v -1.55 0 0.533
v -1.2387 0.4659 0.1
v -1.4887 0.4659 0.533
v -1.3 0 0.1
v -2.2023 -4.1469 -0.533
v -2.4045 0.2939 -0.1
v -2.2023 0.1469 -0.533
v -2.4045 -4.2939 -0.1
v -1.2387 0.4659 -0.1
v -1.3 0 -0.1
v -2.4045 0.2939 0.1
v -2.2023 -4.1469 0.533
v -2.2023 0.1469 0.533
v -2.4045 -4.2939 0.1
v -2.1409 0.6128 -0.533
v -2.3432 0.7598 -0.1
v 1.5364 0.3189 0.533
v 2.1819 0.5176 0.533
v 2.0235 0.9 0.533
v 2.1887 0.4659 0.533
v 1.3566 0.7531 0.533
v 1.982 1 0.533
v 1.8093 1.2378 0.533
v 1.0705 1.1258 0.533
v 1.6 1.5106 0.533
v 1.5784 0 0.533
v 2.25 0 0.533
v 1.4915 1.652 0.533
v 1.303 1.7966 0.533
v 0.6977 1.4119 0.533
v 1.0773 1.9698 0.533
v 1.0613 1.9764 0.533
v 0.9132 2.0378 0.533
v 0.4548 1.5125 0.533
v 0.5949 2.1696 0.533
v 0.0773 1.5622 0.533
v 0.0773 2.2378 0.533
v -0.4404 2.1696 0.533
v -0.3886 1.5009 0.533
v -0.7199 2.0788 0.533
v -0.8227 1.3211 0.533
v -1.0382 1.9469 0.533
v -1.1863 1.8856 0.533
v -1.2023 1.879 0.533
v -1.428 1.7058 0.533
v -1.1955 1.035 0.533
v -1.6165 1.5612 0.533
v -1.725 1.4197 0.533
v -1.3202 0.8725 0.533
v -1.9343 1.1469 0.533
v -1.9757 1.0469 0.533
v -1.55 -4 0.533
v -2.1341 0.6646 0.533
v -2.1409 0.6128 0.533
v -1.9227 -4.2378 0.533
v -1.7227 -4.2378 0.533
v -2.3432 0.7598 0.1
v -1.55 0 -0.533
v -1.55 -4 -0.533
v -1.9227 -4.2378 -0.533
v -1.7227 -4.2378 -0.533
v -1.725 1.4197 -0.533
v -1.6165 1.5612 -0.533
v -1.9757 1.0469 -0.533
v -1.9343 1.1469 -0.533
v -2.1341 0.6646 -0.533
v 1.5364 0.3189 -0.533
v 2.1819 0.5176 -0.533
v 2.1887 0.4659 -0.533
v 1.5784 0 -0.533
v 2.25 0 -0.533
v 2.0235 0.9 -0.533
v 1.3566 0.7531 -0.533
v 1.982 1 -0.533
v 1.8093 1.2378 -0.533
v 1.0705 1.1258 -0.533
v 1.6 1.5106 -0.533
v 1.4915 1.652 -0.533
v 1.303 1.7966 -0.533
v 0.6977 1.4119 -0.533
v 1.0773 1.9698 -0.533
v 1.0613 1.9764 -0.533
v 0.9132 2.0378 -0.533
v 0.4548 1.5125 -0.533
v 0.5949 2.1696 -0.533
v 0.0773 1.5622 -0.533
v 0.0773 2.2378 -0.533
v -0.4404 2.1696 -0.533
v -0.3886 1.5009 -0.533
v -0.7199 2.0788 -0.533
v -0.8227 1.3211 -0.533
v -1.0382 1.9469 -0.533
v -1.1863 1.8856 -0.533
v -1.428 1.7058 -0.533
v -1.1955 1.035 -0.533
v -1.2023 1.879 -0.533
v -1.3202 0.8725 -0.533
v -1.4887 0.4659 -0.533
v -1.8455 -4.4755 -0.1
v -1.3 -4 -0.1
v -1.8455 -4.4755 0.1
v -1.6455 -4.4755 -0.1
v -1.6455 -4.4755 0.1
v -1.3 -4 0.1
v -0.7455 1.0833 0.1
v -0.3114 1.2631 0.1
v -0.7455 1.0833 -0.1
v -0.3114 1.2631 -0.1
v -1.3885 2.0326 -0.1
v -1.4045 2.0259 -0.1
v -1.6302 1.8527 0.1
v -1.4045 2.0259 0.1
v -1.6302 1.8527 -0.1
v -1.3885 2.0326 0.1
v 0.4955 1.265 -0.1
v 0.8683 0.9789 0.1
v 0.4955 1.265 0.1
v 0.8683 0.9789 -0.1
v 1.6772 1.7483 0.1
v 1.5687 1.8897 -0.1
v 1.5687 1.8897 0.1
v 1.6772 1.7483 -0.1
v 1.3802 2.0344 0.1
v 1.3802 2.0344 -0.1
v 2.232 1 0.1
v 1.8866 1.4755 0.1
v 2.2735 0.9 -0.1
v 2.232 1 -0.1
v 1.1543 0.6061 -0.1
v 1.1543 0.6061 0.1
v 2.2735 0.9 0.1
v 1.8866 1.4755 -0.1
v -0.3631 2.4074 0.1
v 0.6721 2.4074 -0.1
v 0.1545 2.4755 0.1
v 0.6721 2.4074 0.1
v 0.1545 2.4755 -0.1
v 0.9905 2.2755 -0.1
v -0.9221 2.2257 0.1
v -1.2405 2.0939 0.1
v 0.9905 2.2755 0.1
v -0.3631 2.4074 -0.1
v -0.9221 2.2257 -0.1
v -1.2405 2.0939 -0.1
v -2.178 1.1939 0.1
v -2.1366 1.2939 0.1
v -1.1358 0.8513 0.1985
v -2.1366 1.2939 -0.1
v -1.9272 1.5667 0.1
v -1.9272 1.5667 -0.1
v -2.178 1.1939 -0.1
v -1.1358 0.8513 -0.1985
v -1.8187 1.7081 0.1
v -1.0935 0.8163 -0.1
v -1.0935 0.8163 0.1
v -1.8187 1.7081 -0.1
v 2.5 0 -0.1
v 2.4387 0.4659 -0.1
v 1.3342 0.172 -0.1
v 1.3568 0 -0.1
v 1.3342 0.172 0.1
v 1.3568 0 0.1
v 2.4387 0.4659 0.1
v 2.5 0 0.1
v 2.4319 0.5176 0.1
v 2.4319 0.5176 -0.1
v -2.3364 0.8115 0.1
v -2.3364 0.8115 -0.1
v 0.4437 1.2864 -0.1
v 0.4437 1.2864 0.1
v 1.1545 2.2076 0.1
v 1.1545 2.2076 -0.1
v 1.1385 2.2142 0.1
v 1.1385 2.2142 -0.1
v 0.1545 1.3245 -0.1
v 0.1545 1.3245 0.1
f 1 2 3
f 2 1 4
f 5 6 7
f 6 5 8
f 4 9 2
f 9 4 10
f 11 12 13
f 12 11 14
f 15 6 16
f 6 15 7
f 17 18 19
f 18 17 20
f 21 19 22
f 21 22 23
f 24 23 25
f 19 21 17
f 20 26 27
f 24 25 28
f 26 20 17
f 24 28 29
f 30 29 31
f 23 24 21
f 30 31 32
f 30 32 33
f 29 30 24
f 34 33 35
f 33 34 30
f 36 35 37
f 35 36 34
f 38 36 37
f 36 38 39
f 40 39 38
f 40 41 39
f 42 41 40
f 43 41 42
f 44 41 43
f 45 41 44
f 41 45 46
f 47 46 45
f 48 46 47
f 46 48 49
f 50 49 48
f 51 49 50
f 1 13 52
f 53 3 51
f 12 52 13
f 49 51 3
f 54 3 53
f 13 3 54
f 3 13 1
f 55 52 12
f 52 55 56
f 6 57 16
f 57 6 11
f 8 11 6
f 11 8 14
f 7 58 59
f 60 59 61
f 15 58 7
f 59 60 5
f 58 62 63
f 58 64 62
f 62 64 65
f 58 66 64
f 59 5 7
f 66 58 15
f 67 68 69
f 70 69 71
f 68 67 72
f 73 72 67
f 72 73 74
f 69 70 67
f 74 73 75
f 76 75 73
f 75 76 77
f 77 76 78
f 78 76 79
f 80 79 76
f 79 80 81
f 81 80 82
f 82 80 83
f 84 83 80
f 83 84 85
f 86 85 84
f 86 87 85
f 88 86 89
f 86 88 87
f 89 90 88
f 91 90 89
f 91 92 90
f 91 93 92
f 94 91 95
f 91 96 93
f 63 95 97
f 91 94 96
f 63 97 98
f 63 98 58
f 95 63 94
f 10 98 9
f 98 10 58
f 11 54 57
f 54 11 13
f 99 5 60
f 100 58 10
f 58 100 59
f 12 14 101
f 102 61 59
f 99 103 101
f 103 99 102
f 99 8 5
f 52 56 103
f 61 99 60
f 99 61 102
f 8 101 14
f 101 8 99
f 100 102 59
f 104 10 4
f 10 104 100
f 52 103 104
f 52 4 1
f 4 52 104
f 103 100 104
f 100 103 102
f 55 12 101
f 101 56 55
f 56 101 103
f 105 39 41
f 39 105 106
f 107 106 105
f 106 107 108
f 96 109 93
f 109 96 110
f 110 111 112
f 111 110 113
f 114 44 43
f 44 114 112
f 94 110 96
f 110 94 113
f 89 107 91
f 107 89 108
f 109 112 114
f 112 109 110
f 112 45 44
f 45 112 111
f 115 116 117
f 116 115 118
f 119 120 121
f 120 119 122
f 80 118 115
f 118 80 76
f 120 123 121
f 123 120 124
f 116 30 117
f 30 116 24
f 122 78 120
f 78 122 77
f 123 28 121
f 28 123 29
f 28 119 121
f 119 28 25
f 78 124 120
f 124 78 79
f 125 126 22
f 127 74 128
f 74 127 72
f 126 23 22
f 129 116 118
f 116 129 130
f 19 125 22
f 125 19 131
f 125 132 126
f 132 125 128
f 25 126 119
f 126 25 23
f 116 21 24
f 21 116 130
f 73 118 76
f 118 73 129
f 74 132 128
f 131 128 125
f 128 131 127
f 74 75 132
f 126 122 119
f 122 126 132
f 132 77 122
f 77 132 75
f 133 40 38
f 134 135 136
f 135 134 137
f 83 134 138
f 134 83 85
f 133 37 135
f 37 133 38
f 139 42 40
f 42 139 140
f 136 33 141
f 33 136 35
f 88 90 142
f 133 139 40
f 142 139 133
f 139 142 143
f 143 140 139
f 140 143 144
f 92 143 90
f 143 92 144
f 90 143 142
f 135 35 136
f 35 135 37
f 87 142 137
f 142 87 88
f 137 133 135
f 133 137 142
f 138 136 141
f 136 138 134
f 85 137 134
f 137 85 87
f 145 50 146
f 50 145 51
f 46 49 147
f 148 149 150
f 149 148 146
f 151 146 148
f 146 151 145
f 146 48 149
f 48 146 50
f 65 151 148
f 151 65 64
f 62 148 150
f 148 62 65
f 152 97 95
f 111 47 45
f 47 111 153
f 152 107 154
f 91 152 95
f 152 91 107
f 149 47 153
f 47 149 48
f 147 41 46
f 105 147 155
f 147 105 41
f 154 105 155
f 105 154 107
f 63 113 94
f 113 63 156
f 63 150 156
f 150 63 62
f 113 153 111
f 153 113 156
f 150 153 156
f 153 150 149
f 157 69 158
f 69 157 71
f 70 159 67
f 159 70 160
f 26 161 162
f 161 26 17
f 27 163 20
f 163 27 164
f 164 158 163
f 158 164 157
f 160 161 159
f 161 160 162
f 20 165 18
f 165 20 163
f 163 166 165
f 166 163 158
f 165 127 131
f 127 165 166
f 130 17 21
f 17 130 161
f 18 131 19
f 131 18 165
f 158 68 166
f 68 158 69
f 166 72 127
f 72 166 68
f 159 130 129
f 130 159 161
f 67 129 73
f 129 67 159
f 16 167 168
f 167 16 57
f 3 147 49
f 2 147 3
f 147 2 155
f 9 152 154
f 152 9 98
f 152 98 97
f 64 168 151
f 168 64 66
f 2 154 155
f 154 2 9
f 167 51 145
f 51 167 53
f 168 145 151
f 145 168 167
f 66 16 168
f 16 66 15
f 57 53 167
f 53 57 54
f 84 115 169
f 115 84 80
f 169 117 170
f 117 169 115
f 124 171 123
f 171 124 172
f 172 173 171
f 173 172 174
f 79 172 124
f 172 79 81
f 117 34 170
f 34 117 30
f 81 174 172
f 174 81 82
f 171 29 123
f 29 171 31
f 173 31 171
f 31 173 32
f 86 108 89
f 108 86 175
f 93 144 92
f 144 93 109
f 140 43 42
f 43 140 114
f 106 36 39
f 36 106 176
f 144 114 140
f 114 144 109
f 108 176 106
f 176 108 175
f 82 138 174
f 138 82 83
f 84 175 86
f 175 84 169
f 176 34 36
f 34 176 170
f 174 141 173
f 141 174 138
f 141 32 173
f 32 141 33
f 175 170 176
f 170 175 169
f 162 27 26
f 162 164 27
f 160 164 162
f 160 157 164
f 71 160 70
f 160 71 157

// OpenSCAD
difference() {
    minkowski() {
        union() {
            difference() {
                difference() {
                    cylinder(h=0.2, r=2, center = true, $fn=24);
                    cylinder(h=0.4, r=1.8, center = true, $fn=24);
                }
                translate([0, -3, 0]) {
                    cube(6, center = true);
                }
            }

            translate([-1.9, -2, 0]) {
                // rotate([90, 0, 0]) {
                // cylinder(h=4, r=0.1, $fn=12);
                //}
                cube([0.2, 4, 0.2], center = true);
            }
        }
        sphere(r = 0.5);
    }

    translate([4, -3, 0]) {
        cube(6, center = true);
    }
}
